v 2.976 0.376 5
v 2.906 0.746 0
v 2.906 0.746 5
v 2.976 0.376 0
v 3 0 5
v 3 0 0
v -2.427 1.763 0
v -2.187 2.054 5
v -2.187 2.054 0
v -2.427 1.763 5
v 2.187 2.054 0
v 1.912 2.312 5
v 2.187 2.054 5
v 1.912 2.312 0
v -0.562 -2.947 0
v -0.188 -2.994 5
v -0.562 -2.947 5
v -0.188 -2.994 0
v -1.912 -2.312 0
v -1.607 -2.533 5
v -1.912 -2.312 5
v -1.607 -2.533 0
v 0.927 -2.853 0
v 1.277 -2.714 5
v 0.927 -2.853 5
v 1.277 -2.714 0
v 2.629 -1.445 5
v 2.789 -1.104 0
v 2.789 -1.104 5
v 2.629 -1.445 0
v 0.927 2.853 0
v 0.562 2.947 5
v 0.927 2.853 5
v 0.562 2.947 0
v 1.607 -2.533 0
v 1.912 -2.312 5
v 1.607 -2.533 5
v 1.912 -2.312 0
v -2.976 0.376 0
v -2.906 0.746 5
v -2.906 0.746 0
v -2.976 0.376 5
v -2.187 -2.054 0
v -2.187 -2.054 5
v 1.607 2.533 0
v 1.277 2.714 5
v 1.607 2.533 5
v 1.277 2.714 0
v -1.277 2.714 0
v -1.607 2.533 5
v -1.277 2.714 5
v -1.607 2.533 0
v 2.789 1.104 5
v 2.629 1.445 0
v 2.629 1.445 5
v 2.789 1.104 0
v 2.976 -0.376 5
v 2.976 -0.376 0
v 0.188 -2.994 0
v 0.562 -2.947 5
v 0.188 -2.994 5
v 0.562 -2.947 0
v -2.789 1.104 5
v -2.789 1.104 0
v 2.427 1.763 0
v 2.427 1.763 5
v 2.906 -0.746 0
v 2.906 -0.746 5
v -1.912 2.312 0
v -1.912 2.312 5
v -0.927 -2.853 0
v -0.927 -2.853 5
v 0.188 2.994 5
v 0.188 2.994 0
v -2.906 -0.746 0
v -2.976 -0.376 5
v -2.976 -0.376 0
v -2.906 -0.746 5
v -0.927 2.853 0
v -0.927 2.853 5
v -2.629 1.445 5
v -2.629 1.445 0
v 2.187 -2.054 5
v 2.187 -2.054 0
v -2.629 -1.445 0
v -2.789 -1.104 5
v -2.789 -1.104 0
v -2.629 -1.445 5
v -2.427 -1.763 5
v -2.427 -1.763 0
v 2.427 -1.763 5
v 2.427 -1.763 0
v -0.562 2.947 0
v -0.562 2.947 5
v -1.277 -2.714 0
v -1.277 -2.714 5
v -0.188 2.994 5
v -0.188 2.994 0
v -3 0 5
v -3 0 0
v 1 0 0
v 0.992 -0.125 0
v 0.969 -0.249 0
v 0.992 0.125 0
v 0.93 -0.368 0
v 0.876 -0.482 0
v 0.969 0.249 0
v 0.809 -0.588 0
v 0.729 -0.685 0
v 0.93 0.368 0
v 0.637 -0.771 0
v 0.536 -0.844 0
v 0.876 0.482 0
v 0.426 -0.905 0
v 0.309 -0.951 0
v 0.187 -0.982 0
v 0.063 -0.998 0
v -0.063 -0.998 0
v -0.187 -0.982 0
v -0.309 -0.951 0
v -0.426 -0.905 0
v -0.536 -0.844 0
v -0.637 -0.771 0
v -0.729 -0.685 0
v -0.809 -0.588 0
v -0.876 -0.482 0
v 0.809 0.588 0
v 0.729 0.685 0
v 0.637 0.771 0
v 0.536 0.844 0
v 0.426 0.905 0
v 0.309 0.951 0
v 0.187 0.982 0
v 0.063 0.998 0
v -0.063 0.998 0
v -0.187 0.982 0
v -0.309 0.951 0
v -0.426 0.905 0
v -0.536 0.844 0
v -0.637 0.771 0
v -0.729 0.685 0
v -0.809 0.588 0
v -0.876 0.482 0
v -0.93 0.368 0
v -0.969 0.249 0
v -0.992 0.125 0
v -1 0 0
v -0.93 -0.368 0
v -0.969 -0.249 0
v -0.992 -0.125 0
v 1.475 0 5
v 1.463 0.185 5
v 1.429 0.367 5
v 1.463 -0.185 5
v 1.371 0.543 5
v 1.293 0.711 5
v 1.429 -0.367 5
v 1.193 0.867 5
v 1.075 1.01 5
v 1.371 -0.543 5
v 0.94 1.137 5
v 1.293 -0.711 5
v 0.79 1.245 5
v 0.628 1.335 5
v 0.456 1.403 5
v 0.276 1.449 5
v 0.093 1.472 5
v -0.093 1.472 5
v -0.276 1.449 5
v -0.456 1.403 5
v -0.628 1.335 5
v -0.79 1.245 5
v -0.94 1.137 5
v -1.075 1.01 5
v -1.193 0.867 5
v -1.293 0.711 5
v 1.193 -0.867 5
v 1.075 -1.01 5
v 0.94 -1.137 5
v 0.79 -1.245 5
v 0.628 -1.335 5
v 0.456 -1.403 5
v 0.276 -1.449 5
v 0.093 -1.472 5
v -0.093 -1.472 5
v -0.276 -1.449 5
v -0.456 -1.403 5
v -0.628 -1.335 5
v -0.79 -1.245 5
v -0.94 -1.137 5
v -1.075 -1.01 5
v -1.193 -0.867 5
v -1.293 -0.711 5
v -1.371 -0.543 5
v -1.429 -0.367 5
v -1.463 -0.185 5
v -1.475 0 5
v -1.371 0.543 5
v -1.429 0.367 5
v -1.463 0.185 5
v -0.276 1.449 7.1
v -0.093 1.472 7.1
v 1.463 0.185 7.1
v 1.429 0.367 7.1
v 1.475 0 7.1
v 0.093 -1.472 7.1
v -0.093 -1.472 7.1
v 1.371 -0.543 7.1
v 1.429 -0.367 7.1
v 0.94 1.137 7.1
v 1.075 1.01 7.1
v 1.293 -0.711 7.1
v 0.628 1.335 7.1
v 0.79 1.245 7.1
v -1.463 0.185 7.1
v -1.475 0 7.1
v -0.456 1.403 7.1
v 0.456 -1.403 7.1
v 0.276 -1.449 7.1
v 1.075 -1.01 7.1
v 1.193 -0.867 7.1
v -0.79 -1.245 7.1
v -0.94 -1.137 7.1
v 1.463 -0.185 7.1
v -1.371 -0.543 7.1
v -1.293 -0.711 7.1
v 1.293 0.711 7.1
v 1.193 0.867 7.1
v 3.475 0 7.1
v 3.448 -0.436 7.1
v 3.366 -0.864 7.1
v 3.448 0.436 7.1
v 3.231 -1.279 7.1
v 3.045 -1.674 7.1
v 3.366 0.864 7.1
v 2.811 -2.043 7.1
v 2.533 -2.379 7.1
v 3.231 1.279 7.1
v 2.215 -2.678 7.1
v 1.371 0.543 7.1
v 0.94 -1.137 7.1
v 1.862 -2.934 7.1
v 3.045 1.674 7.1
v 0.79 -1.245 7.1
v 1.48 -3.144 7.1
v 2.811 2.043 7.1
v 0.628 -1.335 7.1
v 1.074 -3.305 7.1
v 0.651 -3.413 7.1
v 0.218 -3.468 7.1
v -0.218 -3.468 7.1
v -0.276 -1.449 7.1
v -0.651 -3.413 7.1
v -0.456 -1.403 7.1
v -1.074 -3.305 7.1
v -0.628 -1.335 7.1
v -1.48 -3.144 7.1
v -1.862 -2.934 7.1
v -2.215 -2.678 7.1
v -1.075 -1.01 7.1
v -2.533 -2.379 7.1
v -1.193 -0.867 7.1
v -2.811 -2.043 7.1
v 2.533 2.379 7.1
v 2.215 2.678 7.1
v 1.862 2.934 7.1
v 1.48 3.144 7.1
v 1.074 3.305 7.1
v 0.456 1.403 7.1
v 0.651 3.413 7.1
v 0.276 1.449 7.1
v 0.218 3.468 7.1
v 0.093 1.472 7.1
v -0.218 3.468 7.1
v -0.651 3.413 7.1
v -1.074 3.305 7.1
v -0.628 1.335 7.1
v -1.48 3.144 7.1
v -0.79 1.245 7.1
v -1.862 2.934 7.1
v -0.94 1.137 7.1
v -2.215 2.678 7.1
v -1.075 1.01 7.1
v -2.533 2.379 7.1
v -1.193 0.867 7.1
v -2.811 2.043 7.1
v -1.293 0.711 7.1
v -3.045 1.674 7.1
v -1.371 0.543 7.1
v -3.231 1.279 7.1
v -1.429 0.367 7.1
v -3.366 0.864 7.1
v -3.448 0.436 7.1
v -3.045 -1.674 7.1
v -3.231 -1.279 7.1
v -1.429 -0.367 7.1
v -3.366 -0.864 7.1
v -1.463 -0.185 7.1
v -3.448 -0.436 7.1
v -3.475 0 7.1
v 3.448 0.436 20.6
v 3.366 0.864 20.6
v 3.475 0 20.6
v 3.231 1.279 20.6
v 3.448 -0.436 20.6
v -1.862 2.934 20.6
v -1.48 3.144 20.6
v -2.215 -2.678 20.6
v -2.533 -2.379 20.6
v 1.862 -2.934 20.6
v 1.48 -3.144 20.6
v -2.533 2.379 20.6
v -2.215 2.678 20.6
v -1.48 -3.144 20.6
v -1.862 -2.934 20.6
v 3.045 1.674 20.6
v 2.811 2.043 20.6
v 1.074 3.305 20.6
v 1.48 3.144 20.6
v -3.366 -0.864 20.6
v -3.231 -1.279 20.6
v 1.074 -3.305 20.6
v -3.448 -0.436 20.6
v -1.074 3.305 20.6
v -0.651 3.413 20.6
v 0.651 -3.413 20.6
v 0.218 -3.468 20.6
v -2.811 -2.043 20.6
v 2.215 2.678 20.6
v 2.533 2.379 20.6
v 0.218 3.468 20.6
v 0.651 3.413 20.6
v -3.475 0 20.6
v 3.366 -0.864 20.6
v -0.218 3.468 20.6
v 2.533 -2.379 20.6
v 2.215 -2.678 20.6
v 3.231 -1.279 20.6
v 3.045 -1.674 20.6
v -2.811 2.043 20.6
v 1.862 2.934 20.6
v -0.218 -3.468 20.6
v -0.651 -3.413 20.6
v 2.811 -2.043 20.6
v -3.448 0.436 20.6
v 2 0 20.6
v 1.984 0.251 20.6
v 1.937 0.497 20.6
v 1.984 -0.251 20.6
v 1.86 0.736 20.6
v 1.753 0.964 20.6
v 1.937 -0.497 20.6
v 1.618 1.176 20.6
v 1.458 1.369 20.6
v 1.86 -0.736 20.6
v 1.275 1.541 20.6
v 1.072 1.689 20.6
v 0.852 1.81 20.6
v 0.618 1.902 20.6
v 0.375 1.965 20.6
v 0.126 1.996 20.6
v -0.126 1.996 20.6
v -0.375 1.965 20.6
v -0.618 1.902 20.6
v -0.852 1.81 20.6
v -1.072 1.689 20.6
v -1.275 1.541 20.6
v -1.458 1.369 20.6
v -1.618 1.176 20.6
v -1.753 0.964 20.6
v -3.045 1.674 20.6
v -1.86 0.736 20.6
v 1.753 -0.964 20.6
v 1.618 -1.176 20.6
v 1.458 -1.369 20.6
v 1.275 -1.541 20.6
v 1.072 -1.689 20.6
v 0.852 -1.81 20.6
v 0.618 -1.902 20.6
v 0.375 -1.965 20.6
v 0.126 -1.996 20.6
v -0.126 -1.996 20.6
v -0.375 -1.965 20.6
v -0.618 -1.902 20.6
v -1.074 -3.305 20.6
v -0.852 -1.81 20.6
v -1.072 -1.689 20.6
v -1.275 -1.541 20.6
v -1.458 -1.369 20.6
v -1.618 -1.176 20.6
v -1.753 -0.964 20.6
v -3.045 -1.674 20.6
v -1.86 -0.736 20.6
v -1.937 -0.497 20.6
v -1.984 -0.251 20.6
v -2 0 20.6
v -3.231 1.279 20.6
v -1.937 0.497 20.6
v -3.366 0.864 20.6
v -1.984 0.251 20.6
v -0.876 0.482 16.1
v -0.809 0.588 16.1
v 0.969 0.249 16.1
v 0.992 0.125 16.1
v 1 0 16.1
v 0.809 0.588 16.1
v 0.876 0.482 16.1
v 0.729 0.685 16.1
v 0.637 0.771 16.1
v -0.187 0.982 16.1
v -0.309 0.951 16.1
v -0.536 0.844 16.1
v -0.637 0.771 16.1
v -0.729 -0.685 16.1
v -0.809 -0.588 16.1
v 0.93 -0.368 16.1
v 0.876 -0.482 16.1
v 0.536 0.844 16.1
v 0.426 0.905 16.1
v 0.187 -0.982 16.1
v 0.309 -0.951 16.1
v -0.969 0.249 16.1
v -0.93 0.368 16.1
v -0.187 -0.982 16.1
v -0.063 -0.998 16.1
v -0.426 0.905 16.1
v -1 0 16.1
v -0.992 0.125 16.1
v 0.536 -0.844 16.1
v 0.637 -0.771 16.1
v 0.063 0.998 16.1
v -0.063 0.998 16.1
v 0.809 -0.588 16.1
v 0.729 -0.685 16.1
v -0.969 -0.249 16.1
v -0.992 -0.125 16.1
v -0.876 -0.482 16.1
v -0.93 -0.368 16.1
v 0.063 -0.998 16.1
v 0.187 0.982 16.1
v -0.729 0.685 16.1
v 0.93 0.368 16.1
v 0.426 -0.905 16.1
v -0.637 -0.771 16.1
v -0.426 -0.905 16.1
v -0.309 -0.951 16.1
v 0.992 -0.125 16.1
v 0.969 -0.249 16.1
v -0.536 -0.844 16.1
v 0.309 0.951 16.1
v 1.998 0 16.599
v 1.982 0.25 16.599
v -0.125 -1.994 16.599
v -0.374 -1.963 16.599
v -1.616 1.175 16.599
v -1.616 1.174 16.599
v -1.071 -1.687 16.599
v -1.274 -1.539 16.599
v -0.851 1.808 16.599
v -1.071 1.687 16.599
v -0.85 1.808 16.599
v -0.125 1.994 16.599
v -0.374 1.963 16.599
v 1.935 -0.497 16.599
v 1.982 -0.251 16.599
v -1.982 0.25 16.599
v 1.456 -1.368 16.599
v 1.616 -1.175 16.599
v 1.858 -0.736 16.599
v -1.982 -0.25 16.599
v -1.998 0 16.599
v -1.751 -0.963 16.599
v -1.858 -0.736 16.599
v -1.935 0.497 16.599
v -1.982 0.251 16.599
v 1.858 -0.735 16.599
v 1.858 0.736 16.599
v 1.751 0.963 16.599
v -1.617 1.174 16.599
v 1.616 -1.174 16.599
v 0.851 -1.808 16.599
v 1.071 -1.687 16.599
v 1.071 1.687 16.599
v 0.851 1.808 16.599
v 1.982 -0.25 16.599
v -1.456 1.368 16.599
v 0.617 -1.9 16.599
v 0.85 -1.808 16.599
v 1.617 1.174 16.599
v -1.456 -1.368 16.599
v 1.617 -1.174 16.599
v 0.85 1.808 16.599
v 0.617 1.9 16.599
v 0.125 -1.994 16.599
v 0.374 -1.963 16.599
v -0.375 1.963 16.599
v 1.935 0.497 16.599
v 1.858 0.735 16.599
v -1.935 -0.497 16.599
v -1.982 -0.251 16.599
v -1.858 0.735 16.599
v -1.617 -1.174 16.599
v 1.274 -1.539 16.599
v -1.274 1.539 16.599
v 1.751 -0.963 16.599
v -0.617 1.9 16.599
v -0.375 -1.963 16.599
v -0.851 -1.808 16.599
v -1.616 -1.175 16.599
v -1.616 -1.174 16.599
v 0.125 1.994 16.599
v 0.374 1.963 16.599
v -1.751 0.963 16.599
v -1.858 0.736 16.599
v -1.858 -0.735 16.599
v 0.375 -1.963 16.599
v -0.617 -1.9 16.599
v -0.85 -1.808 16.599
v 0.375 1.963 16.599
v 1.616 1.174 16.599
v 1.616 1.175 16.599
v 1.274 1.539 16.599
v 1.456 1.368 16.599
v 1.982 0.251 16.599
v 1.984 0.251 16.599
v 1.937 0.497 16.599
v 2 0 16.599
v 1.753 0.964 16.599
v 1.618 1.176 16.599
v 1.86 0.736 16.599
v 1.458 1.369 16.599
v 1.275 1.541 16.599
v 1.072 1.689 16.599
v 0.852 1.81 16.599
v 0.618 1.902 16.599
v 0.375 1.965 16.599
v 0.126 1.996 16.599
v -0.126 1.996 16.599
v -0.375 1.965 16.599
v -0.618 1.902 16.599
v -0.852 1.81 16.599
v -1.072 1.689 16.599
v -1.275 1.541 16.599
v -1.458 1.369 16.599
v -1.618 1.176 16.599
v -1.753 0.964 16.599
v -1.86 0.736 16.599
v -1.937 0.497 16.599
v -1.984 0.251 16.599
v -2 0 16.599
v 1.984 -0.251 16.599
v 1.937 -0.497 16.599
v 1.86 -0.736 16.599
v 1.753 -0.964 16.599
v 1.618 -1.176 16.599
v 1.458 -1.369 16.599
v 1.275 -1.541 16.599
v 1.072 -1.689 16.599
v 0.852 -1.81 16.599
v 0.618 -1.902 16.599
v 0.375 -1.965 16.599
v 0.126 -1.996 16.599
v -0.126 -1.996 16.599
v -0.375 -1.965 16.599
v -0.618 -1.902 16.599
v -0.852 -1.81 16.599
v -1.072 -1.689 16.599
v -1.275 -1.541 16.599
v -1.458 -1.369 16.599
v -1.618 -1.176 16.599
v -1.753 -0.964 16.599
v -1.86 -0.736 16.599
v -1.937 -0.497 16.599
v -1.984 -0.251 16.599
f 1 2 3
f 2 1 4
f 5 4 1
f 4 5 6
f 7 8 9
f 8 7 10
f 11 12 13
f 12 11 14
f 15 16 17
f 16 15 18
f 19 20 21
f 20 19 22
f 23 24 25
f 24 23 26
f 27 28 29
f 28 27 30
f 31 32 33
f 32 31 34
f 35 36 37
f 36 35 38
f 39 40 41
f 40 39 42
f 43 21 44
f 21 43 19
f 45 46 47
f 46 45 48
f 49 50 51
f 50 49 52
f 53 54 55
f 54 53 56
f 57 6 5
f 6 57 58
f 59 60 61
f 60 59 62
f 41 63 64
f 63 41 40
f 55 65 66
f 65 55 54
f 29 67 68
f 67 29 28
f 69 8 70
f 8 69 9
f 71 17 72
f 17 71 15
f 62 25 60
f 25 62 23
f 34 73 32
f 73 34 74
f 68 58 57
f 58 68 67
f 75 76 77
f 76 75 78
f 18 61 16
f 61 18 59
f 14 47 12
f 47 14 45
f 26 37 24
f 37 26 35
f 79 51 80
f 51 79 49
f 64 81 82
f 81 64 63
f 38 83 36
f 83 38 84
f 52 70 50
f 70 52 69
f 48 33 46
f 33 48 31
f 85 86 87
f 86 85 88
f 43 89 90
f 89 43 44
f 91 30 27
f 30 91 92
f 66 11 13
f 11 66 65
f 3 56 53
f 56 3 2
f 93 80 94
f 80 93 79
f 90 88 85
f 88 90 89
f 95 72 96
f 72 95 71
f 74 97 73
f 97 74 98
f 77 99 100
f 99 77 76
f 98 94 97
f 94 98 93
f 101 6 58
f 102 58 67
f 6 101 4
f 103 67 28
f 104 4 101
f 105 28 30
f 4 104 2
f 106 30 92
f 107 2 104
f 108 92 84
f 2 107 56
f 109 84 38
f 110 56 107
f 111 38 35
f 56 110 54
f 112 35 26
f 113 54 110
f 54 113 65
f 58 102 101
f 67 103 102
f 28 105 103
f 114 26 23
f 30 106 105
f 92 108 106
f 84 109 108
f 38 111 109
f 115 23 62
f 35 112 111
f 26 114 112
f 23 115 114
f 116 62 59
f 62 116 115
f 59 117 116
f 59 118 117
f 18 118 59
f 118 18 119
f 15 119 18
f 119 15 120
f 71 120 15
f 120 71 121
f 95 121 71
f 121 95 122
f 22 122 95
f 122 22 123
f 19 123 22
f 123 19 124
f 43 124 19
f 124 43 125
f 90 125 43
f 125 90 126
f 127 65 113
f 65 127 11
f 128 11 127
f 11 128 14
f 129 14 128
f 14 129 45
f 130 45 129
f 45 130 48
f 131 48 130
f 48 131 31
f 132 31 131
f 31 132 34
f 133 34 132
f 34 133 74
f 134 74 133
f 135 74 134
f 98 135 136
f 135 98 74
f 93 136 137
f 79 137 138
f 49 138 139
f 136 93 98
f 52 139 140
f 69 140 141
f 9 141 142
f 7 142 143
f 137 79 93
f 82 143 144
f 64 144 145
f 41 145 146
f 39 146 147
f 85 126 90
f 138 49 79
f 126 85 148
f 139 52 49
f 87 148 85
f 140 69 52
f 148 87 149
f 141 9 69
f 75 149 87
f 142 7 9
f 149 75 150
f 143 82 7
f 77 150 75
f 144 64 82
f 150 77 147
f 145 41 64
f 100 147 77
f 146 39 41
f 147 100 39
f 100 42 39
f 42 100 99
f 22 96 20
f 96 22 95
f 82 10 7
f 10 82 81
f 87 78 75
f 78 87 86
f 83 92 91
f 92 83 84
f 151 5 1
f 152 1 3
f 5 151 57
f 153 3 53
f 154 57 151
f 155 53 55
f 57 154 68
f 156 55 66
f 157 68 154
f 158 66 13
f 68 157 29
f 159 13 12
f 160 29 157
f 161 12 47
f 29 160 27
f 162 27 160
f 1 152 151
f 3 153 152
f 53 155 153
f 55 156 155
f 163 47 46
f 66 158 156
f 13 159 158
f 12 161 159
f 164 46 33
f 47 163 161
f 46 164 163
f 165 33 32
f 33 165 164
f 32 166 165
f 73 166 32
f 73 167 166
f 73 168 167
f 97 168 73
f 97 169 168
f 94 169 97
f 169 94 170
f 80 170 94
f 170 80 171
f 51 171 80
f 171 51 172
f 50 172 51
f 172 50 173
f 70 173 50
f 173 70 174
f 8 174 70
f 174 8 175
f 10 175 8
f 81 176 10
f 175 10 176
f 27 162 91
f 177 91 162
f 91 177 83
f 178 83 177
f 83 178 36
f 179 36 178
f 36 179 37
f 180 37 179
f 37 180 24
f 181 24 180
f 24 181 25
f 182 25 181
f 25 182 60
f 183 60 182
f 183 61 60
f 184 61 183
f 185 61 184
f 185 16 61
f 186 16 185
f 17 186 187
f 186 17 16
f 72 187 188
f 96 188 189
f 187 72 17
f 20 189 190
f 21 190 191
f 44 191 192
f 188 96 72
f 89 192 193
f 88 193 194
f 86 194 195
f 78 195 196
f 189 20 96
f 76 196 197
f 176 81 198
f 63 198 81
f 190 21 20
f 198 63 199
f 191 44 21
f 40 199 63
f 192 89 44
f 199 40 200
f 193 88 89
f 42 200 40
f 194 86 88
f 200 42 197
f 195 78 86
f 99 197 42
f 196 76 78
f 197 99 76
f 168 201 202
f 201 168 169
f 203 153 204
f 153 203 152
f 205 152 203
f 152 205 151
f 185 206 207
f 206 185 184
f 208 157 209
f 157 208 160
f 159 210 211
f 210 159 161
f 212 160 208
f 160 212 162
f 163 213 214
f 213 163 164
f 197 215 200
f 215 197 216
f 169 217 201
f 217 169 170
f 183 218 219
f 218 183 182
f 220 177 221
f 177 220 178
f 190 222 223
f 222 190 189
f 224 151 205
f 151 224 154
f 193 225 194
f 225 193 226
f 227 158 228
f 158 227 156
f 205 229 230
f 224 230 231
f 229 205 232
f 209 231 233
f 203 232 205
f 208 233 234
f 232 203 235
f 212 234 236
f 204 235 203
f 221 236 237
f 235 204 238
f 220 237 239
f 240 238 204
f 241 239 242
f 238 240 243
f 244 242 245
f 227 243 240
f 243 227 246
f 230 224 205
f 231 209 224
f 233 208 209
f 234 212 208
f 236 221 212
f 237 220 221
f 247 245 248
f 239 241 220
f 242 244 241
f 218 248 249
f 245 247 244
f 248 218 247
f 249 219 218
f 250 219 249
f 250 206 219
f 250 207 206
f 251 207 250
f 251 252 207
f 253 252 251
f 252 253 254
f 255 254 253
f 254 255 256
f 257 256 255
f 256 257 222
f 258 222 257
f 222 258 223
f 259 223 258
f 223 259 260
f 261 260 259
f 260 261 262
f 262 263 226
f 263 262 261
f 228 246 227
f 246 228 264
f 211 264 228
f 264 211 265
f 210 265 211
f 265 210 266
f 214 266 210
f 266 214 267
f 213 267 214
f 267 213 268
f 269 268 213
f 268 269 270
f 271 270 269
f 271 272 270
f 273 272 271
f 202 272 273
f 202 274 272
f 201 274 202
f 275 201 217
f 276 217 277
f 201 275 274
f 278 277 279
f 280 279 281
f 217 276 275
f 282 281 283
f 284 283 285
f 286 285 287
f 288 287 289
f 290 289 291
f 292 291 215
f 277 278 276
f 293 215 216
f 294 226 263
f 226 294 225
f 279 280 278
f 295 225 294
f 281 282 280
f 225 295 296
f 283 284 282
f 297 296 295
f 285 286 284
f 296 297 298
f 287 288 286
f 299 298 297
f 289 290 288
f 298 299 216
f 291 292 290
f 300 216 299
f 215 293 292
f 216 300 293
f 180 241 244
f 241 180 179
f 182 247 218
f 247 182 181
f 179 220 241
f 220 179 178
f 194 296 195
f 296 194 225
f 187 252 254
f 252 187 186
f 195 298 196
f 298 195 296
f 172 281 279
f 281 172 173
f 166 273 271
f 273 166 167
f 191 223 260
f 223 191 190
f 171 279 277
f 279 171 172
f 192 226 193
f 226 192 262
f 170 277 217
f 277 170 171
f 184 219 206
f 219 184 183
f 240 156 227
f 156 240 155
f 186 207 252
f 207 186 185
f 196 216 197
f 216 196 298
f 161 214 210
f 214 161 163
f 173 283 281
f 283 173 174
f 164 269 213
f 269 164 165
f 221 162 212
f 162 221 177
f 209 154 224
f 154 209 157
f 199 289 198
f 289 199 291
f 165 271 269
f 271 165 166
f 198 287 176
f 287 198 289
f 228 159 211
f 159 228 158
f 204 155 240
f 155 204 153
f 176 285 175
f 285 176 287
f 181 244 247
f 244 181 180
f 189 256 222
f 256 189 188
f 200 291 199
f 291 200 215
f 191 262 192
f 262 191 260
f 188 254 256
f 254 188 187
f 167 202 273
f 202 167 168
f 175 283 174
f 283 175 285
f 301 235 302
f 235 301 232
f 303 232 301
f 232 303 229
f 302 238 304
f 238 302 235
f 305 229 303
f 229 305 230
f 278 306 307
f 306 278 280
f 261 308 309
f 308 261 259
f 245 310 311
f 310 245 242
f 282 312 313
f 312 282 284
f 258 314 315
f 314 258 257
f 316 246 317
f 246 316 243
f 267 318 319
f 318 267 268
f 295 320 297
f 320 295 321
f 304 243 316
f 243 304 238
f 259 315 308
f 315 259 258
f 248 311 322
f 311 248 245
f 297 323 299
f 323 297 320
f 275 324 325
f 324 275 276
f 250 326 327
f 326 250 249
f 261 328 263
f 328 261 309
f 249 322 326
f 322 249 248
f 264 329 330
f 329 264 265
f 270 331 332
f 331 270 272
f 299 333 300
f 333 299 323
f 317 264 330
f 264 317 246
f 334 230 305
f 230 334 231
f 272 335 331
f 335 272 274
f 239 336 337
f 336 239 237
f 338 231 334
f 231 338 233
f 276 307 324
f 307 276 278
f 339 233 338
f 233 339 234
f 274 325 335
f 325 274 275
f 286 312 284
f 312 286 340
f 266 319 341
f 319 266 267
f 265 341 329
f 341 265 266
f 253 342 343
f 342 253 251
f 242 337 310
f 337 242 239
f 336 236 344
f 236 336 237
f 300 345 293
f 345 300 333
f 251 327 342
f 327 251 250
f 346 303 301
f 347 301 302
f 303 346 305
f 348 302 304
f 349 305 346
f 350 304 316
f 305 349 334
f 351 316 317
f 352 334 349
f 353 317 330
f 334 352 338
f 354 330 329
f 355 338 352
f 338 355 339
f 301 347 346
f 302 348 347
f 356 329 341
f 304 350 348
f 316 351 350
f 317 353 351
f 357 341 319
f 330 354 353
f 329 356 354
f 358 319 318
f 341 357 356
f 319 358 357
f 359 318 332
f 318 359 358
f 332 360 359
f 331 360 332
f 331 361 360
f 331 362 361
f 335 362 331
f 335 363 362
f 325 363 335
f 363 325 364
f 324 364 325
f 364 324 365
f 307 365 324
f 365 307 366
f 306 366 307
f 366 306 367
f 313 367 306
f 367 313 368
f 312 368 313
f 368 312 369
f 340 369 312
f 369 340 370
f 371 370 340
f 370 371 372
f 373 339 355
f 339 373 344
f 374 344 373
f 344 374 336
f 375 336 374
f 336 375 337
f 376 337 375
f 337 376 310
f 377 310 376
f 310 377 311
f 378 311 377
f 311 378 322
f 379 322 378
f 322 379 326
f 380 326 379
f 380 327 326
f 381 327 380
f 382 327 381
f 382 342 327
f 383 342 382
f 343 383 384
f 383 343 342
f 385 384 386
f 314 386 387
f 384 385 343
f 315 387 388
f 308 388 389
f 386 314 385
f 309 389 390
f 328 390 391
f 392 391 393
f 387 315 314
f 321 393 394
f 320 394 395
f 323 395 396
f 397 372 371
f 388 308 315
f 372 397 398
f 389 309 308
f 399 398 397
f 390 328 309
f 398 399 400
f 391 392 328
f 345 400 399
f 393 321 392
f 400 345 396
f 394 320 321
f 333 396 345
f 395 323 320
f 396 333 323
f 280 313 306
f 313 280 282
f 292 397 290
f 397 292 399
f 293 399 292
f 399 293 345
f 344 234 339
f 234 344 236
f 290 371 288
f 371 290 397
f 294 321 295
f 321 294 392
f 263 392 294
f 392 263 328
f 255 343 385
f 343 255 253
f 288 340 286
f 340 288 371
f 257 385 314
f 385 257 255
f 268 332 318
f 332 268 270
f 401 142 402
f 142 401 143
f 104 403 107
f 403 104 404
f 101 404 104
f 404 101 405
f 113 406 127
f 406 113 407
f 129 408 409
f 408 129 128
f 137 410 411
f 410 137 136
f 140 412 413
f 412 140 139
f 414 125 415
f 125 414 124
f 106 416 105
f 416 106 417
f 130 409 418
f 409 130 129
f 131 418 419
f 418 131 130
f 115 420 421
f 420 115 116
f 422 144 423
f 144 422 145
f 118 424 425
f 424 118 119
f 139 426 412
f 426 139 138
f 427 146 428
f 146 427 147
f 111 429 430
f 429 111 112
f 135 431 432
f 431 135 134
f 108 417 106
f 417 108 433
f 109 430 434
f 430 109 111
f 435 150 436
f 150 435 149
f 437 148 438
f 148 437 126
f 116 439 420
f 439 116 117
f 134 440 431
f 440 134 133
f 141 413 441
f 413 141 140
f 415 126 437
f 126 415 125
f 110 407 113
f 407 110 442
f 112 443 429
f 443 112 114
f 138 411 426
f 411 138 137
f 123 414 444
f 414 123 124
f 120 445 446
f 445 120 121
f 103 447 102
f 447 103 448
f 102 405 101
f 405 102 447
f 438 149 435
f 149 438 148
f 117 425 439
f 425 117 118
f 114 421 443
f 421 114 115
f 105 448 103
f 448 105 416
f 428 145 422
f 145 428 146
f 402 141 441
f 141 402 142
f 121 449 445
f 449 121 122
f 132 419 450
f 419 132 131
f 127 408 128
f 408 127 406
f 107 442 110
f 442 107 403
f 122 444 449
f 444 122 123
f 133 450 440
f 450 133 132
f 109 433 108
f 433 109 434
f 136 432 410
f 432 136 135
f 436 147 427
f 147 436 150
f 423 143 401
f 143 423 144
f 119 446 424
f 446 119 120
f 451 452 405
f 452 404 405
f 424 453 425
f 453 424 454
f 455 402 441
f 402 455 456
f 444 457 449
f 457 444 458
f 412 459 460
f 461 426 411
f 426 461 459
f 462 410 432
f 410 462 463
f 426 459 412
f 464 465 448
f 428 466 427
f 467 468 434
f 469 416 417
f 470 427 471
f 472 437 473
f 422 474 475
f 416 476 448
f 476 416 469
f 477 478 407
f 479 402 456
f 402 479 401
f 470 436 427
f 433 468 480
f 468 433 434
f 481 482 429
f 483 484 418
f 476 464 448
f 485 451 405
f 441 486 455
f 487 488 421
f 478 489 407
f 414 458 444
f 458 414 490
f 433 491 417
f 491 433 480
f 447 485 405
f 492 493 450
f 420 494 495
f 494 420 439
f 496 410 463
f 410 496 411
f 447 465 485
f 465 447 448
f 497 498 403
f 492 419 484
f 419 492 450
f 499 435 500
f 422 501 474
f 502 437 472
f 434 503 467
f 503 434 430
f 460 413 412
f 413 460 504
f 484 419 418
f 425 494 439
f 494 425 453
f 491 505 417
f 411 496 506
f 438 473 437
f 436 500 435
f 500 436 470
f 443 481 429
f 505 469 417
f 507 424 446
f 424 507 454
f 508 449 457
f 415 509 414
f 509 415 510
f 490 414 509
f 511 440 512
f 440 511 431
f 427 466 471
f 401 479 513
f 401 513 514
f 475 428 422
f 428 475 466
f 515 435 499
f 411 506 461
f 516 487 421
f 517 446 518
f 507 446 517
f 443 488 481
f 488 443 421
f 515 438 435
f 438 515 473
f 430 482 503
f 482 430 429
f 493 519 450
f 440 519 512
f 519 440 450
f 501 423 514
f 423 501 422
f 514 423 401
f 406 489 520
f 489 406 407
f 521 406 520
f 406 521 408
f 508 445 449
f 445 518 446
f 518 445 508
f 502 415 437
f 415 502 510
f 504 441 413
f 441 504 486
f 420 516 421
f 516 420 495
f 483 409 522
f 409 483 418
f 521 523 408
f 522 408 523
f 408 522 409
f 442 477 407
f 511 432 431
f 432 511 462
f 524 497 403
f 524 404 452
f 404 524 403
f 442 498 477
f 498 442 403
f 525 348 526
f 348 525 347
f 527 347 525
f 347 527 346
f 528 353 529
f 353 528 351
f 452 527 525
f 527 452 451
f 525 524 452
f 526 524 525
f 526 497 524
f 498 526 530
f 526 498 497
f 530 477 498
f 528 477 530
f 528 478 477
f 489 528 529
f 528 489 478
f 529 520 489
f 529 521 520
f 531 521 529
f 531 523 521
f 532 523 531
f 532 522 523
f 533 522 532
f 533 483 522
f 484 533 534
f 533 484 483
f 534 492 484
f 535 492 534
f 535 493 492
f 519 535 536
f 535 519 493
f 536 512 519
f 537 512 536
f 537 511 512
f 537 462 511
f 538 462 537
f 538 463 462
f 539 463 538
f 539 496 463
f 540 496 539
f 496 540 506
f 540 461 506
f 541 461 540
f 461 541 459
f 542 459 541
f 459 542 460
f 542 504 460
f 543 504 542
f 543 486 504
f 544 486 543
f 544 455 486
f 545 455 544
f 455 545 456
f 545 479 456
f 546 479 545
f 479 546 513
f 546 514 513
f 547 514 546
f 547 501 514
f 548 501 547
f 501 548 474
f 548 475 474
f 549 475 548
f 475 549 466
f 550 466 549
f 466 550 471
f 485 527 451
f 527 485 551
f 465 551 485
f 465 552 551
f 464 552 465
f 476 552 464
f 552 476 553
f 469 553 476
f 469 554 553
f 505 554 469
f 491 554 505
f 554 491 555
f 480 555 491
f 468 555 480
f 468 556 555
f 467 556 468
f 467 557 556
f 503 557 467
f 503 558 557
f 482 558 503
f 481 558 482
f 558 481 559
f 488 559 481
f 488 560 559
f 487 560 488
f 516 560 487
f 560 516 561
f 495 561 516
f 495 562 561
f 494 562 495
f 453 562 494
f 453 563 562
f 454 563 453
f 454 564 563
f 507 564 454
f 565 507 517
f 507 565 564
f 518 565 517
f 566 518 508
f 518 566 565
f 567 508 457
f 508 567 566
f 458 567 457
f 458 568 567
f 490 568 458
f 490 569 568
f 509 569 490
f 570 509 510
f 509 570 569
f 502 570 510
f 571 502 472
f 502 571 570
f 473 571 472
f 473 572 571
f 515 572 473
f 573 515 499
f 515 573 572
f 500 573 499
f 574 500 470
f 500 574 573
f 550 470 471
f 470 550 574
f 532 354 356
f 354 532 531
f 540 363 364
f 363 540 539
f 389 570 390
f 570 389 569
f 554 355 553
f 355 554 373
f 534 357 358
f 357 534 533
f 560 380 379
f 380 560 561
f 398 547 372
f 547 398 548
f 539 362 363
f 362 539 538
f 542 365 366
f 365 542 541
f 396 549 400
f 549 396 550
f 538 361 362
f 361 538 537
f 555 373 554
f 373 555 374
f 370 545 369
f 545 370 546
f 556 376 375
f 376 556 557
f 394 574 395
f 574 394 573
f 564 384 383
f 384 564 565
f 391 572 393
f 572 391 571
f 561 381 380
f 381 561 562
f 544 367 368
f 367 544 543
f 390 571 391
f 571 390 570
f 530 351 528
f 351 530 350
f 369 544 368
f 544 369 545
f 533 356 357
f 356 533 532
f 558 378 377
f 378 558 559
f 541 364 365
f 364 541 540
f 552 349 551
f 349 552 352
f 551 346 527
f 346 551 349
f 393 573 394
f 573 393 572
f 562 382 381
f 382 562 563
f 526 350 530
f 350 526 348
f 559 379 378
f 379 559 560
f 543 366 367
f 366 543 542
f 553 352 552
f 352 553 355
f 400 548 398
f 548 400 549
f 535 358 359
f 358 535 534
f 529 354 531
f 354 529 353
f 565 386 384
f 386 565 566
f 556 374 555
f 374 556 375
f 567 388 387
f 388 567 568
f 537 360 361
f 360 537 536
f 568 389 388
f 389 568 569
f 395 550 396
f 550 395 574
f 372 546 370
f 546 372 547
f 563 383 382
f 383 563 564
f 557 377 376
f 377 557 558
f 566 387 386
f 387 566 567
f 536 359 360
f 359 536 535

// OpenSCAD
// Copyright 2017 Pavel Penev
// https://www.thingiverse.com/pavpen/about
//
// You can use this file under Attribution-ShareAlike 4.0 International
// (CC BY-SA 4.0).
//
// If you need to use it under another license, send me a message.

threaded_base_r = 6 / 2;
threaded_base_h = 5;
neck_r = 2.95 / 2;
neck_h = 2.1;
radiator_r = 6.95 / 2;
radiator_h = 13.5;

filament_hole_r = 2 / 2;
filament_hole_h = 16.1;
bowden_tube_hole_r = 4 / 2;
bowden_tube_hole_h = 4;
hole_transition_h = 0.5;

$fn = 50;


// Export functions:
function pro_pavpen_e3d_v6_heat_break_threaded_base_h() = threaded_base_h;

function pro_pavpen_e3d_v6_heat_break_neck_h() = neck_h;

function pro_pavpen_e3d_v6_heat_break_radiator_h() = radiator_h;


// Demo:
pro_pavpen_e3d_v6_heat_break();


module pro_pavpen_e3d_v6_heat_break()
{
    difference()
    {
        pro_pavpen_e3d_v6_heat_break_body();

        pro_pavpen_e3d_v6_heat_break_hole();
    }
}

module pro_pavpen_e3d_v6_heat_break_body()
{
    union()
    {
        // Threaded base:
        cylinder(
            r = threaded_base_r,
            h = threaded_base_h);
        
        // Neck:
        translate([0, 0, threaded_base_h])
        cylinder(r = neck_r, h = neck_h);
        
        // Heat radiator:
        translate([0, 0, threaded_base_h + neck_h])
        cylinder(r = radiator_r, h = radiator_h);
    }
}

module pro_pavpen_e3d_v6_heat_break_hole(
    bottom_extra_h = 1,
    top_extra_h = 1
)
{
    hole_overlap_h = 0.001;
    
    union()
    {
        // Filament hole:
        translate([0, 0, -bottom_extra_h])
        cylinder(
            r = filament_hole_r,
            h = filament_hole_h + bottom_extra_h + hole_overlap_h);
        
        // Transition region:
        translate([0, 0, filament_hole_h])
        cylinder(
            r1 = filament_hole_r,
            r2 = bowden_tube_hole_r,
            h = hole_transition_h);
        
        // Bowden tube hole:
        translate([
            0,
            0,
            filament_hole_h + hole_transition_h - hole_overlap_h])
        cylinder(
            r = bowden_tube_hole_r,
            h = bowden_tube_hole_h + top_extra_h + hole_overlap_h);
    }
}
